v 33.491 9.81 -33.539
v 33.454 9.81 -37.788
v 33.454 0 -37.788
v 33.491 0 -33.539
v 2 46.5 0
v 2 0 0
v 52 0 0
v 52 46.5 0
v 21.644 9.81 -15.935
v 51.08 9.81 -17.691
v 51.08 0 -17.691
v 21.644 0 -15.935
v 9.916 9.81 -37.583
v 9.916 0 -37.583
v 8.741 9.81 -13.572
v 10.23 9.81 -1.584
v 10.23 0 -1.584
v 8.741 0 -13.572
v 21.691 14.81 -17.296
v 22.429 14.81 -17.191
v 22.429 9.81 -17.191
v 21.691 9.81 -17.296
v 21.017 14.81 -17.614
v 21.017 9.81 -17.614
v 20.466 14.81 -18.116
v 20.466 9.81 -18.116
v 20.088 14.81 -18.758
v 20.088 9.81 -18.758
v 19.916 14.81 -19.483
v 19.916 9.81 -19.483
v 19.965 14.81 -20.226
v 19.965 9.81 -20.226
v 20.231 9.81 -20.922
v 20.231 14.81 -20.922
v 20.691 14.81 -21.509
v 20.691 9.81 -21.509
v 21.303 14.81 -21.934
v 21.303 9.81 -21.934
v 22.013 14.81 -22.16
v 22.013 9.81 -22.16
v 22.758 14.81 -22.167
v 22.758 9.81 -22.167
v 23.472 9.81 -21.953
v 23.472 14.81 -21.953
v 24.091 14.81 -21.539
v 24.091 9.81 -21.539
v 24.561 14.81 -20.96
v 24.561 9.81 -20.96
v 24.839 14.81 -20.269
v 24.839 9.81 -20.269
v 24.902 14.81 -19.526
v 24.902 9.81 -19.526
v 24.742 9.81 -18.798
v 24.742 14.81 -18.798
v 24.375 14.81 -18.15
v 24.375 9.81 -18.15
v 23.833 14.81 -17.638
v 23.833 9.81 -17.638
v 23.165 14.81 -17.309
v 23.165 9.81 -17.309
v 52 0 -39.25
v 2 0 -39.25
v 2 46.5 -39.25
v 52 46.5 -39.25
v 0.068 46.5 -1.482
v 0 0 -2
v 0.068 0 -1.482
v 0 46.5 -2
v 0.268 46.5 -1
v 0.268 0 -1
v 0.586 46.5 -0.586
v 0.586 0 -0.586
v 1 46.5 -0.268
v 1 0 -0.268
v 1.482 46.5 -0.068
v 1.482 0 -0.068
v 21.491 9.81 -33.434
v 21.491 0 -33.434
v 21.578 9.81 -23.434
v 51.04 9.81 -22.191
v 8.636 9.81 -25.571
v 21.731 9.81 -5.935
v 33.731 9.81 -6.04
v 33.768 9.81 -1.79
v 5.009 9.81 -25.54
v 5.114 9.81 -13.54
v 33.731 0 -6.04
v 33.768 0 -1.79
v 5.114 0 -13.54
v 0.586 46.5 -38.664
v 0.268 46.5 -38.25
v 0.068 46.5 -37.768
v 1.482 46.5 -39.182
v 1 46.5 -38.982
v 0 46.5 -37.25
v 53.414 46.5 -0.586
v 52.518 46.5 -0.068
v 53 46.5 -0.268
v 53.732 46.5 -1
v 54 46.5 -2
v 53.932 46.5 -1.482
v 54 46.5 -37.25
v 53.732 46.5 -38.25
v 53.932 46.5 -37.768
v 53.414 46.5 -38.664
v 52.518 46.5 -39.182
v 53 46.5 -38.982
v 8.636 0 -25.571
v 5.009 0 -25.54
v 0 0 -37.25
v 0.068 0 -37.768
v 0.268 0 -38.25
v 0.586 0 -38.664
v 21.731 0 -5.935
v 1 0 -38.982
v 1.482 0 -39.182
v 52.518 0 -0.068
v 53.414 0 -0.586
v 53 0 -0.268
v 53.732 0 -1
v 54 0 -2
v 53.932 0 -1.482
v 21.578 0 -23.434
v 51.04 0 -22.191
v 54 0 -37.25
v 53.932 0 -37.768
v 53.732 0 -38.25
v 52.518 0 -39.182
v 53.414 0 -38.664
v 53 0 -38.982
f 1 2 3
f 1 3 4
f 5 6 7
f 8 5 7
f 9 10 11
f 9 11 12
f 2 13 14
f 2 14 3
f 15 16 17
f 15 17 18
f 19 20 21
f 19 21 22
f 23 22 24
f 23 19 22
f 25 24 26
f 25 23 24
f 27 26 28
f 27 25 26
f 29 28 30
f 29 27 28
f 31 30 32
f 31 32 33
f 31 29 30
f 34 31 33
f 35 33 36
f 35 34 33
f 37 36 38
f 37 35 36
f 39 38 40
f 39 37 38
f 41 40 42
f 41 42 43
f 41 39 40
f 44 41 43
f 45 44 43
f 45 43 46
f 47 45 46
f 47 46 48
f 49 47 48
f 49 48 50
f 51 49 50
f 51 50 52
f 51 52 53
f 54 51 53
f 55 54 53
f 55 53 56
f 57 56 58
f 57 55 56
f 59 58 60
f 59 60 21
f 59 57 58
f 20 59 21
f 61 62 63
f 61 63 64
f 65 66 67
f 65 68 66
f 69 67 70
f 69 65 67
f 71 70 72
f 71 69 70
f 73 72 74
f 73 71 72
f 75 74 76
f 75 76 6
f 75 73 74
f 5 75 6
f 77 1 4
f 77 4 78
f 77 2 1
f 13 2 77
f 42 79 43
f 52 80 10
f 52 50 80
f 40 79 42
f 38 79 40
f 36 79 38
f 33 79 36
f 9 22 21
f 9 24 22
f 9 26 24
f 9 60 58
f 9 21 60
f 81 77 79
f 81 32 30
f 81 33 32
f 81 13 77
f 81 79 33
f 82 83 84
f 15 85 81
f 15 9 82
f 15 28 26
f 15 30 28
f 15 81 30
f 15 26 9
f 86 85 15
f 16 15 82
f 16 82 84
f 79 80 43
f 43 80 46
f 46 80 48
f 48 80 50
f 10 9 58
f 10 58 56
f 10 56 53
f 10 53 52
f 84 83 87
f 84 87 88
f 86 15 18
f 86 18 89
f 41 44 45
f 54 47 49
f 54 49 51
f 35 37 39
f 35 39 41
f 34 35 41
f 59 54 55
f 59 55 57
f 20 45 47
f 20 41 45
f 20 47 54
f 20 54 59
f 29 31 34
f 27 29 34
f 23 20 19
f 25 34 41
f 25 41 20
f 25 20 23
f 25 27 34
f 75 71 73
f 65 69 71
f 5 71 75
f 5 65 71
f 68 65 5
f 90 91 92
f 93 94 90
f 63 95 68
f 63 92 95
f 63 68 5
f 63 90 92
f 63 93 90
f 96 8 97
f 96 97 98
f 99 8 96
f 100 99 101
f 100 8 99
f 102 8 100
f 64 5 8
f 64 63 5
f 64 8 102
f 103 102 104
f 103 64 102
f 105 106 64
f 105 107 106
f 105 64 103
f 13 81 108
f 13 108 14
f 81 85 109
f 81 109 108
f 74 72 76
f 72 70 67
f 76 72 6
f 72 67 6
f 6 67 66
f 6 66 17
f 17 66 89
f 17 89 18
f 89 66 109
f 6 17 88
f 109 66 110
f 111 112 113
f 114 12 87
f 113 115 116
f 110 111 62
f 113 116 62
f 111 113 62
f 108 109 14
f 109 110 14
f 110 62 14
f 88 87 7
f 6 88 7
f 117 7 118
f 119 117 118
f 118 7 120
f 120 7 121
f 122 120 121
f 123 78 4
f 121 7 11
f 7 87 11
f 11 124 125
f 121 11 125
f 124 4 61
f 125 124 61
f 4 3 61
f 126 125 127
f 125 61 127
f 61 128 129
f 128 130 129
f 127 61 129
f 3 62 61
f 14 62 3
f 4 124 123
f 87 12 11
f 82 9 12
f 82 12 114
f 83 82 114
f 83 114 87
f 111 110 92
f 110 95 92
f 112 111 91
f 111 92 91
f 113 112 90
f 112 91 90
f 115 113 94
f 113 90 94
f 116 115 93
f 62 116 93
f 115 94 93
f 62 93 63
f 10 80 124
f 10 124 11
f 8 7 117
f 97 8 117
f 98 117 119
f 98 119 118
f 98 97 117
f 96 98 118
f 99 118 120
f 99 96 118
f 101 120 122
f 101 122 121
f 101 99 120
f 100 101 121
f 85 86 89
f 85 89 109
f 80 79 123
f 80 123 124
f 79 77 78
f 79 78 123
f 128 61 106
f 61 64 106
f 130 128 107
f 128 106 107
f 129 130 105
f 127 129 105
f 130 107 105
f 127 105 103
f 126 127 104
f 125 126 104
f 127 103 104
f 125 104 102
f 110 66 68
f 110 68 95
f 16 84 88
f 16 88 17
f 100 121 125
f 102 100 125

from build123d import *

# Parameters (mm, degrees)
SKETCH1_W              = 54
SKETCH1_H              = 39.25
BOSS_EXTRUDE1_DEPTH    = 46.5
FILLET1_R              = 2
FILLET2_R              = 2
Z_95_START             = -0.023652431
Z_95_BLANK_DEPTH       = 10
Z_95_START_2           = -5.023652431
Z_95_BLANK_2_OUTLINE_R = 2.5
Z_95_BLANK_2_DEPTH     = 5
BODY_MOVE_COPY3_ANGLE  = 180
BODY_MOVE_COPY4_ANGLE  = 89.5


with BuildPart() as part:
    # Sketch1 → Boss-Extrude1 (new body)
    with BuildSketch(Plane(origin=(0, 0, 0), x_dir=(1, 0, 0), z_dir=(0, 1, 0))):
        with Locations((27, 19.625)):
            Rectangle(SKETCH1_W, SKETCH1_H)
    extrude(amount=BOSS_EXTRUDE1_DEPTH)

    # Fillet1
    fillet1_edges = [part.edges().sort_by_distance(p)[0] for p in [
        (0, 23.25, 0),
    ]]
    fillet(fillet1_edges, radius=FILLET1_R)

    # Fillet2
    fillet2_edges = [part.edges().sort_by_distance(p)[0] for p in [
        (0, 23.25, -39.25),
        (54, 23.25, -39.25),
        (54, 23.25, 0),
    ]]
    fillet(fillet2_edges, radius=FILLET2_R)


with BuildPart() as body_2:
    # Z-95 Blank: read off the stored shape, not the designer's step
    # Z-95 Blank outline → Z-95 Blank (new body)
    with BuildSketch(Plane(origin=(0, 0, 0), x_dir=(1, 0, 0), z_dir=(0, 1, 0)).offset(Z_95_START)):
        Polygon((-39.475833264, 51.689675598), (-39.475833264, 48.062948495), (-51.475833264, 46.678320586), (-51.475833264, 23.139646129), (-47.225833264, 23.139646129), (-47.225833264, 35.139646129), (-37.225833264, 35.139646129), (-35.725833264, 5.689675598), (-31.225833264, 5.689675598), (-29.725833264, 35.139646129), (-19.725833264, 35.139646129), (-19.725833264, 23.139646129), (-15.475833264, 23.139646129), (-15.475833264, 46.678320586), (-27.475833264, 48.062948495), (-27.475833264, 51.689675598), align=None)
    extrude(amount=Z_95_BLANK_DEPTH)

    # Z-95 Blank 2 outline → Z-95 Blank 2 (add)
    with BuildSketch(Plane(origin=(0, 0, 0), x_dir=(1, 0, 0), z_dir=(0, 1, 0)).offset(Z_95_START_2)):
        with Locations((-33.475833264, 34.343753809)):
            Circle(Z_95_BLANK_2_OUTLINE_R)
    extrude(amount=Z_95_BLANK_2_DEPTH)


with BuildPart() as body_2_1:
    # Body-Move/Copy3: moved
    add(body_2.part.rotate(Axis((0, 2.476347569, -28.689675598), (1, 0, 0)), BODY_MOVE_COPY3_ANGLE))


with BuildPart() as body_2_2:
    # Body-Move/Copy4: moved
    add(body_2_1.part.rotate(Axis((-33.475833264, 0, -28.689675598), (0, -1, 0)), BODY_MOVE_COPY4_ANGLE))


with BuildPart() as body_2_3:
    # Body-Move/Copy5: moved
    add(body_2_2.part.moved(Location((61.536777905, 5.06338101, 8.948981511))))


with BuildPart() as body_2_4:
    # Body-Move/Copy6: moved
    add(body_2_3.part.moved(Location((0, -0.229742035, 0))))


with BuildPart() as part_1:
    add(part.part)

    # Intersect1: read off the stored shape, not the designer's step
    # Intersect1: cut body 2
    add(body_2_4.part, mode=Mode.SUBTRACT)


solid = part_1.part
